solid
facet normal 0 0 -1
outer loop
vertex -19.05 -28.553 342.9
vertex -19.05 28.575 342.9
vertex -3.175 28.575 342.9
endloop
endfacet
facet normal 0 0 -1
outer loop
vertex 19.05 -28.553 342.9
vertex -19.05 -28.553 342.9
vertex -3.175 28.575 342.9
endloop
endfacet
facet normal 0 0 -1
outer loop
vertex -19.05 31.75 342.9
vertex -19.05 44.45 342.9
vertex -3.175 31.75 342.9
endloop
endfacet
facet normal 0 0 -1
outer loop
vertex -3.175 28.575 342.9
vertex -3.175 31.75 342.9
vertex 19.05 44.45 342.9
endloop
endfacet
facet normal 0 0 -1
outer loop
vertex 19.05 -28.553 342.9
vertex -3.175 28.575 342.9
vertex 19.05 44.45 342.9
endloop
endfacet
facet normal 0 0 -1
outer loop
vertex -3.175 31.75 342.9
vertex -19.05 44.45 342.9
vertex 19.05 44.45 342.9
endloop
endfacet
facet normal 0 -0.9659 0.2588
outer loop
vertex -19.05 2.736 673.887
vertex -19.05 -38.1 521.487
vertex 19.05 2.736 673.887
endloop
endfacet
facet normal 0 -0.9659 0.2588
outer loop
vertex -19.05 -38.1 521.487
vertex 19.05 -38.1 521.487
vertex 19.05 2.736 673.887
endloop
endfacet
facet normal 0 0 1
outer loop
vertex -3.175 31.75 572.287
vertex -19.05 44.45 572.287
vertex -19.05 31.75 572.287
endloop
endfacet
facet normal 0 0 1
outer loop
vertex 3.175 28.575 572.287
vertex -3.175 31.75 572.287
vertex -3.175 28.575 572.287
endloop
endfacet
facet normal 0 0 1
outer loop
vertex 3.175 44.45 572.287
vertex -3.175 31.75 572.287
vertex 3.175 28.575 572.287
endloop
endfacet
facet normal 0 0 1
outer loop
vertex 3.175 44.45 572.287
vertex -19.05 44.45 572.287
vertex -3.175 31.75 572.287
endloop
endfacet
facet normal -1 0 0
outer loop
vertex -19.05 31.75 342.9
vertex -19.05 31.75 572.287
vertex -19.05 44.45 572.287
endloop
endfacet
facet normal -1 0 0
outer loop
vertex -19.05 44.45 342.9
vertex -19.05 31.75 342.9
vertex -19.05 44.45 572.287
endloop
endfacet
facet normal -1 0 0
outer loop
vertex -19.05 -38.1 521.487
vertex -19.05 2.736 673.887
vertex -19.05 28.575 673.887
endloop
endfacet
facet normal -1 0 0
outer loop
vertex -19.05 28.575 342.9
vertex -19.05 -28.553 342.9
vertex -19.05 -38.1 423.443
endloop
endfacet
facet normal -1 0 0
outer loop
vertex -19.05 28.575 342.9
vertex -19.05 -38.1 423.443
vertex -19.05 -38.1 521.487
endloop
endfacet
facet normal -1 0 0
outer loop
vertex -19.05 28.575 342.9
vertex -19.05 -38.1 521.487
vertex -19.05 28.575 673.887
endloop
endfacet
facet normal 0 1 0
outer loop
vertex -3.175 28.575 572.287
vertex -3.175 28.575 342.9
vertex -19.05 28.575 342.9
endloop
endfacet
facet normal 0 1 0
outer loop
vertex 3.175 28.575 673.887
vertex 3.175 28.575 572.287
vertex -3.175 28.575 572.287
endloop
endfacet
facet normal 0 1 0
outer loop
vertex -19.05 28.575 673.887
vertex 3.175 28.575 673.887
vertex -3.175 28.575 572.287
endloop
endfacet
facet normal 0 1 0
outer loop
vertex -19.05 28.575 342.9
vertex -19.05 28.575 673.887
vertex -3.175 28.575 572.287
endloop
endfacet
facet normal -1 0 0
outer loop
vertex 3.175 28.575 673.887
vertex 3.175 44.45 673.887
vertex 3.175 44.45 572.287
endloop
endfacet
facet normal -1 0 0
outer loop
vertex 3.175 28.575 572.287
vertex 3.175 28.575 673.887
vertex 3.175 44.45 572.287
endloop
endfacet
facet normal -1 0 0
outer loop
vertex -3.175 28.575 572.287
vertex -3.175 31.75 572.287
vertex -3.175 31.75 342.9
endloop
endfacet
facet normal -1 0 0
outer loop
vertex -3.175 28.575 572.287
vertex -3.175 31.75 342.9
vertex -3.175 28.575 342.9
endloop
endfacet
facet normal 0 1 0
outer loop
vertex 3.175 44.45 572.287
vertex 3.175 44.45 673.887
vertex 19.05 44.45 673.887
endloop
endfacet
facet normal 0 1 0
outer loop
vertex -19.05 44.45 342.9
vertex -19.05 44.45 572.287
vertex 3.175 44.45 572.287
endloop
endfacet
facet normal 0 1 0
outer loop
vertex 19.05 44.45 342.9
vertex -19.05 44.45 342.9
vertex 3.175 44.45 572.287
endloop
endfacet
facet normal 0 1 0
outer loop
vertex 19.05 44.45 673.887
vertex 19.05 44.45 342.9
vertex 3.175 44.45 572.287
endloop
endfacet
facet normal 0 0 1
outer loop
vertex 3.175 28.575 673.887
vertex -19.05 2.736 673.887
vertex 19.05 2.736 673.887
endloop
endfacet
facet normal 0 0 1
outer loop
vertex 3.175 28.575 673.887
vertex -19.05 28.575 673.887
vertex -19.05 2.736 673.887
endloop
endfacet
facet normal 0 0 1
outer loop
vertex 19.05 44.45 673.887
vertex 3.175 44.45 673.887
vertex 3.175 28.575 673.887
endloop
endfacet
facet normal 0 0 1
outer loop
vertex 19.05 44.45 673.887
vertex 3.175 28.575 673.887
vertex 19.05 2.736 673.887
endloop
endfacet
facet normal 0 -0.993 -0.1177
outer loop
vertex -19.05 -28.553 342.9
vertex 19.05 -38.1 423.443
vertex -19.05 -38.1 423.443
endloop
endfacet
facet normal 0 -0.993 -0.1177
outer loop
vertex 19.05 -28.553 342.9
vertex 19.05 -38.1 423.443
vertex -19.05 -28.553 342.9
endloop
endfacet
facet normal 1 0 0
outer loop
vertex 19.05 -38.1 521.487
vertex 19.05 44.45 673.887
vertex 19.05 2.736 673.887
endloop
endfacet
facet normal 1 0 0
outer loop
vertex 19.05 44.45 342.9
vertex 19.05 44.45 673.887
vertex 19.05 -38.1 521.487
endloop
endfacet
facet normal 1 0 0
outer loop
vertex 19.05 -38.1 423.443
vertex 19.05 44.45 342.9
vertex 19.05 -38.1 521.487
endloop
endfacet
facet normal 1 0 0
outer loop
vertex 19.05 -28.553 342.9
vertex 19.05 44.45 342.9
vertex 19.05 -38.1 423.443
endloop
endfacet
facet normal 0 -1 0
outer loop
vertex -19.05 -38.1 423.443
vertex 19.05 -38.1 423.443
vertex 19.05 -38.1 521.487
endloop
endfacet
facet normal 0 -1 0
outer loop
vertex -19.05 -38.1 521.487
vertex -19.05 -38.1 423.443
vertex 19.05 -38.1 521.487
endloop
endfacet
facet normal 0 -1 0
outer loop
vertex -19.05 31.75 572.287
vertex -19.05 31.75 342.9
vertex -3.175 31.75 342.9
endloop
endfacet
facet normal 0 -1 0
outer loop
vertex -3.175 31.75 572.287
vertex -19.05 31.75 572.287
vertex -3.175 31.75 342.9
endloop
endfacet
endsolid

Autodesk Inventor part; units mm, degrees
ref_plane "YZ Plane" through (0, 0, 0) normal (1, 0, 0) x (0, 1, 0)
ref_plane "XZ Plane" through (0, 0, 0) normal (0, 1, 0) x (-1, 0, 0)
ref_plane "XY Plane" through (0, 0, 0) normal (0, 0, 1) x (1, 0, 0)
sketch "Sketch1" plane through (0, 0, 0) normal (0, 0, 1) x (1, 0, 0)
  line L0 (19.05, -44.45) -> (-19.05, -44.45)
  line L1 (-19.05, -44.45) -> (-19.05, 44.45)
  line L2 (-19.05, 44.45) -> (19.05, 44.45)
  line L3 (19.05, 44.45) -> (19.05, -44.45)
  line L4 (19.05, -44.45) -> (-19.05, 44.45) construction
  line L5 (-19.05, -44.45) -> (19.05, 44.45) construction
  point P0 (0, 0)
  dimension "d0" = 38.1
  dimension "d1" = 88.9
extrude "Extrusion1" add sketch "Sketch1" along normal blind 673.8874
sketch "Sketch2" plane through (0, 0, 673.8874) normal (0, 0, 1) x (1, 0, 0)
  line L0 (19.05, -44.45) -> (19.05, 44.45) projected
  line L1 (19.05, 44.45) -> (-19.05, 44.45) projected
  line L2 (19.05, 31.75) -> (3.175, 31.75)
  line L3 (3.175, 31.75) -> (3.175, 28.575)
  line L4 (3.175, 28.575) -> (19.05, 28.575)
  line L5 (19.05, 28.575) -> (19.05, 31.75)
  line L6 (-19.05, 44.45) -> (-19.05, -44.45) projected
  line L7 (0, 25.0075) -> (0, 34.7359)
  line L8 (-19.05, 31.75) -> (-3.175, 31.75)
  line L9 (-3.175, 31.75) -> (-3.175, 28.575)
  line L10 (-3.175, 28.575) -> (-19.05, 28.575)
  line L11 (-19.05, 28.575) -> (-19.05, 31.75)
  point P0 (0, 0)
  dimension "d4" = 12.7
  dimension "d5" = 3.175
  dimension "d6" = 15.875
sketch "Sketch4" plane through (19.05, -44.45, 673.8874) normal (1, 0, 0) x (0, 0, -1)
  line L0 (0, 0) -> (0, 88.9) projected
  line L1 (673.8874, 0) -> (0, 0) projected
  line L2 (673.8874, 88.9) -> (673.8874, 0) projected
  line L3 (673.8874, 6.35) -> (0, 6.35)
  line L4 (152.4, 6.35) -> (0, 47.1855)
  line L5 (250.444, 6.35) -> (421.8705, 26.67)
  line L6 (421.8705, 26.67) -> (673.8874, 26.67)
  point P0 (673.8874, 73.025)
  point P1 (0, 73.025)
  point P2 (673.8874, 44.45)
  dimension "d15" = 6.35
  dimension "d20" = 152.4
  dimension "d21" = 165
  dimension "d23" = 20.32
  dimension "d24" = 98.044
  dimension "d25" = 173.24
extrude "Extrusion3" cut sketch "Sketch4" against normal blind 152.4
sketch "Sketch5" plane through (-19.05, 44.45, 0) normal (0, 1, 0) x (1, 0, 0)
  line L0 (38.1, -673.8874) -> (15.875, -673.8874)
  line L1 (15.875, -673.8874) -> (15.875, -572.2874)
  line L2 (15.875, -572.2874) -> (38.1, -572.2874)
  line L3 (38.1, -572.2874) -> (38.1, -673.8874)
  line L4 (19.05, -558.0239) -> (19.05, -615.4069)
  line L5 (0, -673.8874) -> (22.225, -673.8874)
  line L6 (22.225, -673.8874) -> (22.225, -572.2874)
  line L7 (22.225, -572.2874) -> (0, -572.2874)
  line L8 (0, -572.2874) -> (0, -673.8874)
  point P0 (19.05, 0)
  dimension "d28" = 22.225
  dimension "d29" = 101.6
extrude "Extrusion4" cut sketch "Sketch5" against normal blind 15.875 contours L0 L1 L2 L6 | L5 L8 L7 L1
sketch "Sketch6" plane through (-19.05, 44.45, 0) normal (0, 1, 0) x (1, 0, 0)
  line L0 (38.1, 0) -> (38.1, -673.8874) projected
  line L1 (0, 0) -> (38.1, 0) projected
  line L2 (38.1, -215.9) -> (0, -215.9)
  line L3 (0, -215.9) -> (0, -342.9)
  line L4 (0, -342.9) -> (38.1, -342.9)
  line L5 (38.1, -342.9) -> (38.1, -215.9)
  point P0 (38.1, -572.2874)
  point P1 (19.05, 0)
  dimension "d32" = 127
  dimension "d33" = 215.9
  dimension "d36" = 38.1
extrude "Extrusion5" cut sketch "Sketch6" against normal blind 15.875
sketch "Sketch7" plane through (0, 0, 0) normal (0, 0, -1) x (-1, 0, 0)
  line L0 (41.2519, 59.9443) -> (-67.5031, 59.9443)
  line L1 (-67.5031, 59.9443) -> (-67.5031, -55.7754)
  line L2 (-67.5031, -55.7754) -> (41.2519, -55.7754)
  line L3 (41.2519, -55.7754) -> (41.2519, 59.9443)
  point P0 (0, 0)
extrude "Extrusion6" cut sketch "Sketch7" against normal blind 342.9
extrude "Extrusion7" cut sketch "Sketch2" against normal blind 508 contours L8 L9 L10 L6
properties part number "FrontSkidRight"
